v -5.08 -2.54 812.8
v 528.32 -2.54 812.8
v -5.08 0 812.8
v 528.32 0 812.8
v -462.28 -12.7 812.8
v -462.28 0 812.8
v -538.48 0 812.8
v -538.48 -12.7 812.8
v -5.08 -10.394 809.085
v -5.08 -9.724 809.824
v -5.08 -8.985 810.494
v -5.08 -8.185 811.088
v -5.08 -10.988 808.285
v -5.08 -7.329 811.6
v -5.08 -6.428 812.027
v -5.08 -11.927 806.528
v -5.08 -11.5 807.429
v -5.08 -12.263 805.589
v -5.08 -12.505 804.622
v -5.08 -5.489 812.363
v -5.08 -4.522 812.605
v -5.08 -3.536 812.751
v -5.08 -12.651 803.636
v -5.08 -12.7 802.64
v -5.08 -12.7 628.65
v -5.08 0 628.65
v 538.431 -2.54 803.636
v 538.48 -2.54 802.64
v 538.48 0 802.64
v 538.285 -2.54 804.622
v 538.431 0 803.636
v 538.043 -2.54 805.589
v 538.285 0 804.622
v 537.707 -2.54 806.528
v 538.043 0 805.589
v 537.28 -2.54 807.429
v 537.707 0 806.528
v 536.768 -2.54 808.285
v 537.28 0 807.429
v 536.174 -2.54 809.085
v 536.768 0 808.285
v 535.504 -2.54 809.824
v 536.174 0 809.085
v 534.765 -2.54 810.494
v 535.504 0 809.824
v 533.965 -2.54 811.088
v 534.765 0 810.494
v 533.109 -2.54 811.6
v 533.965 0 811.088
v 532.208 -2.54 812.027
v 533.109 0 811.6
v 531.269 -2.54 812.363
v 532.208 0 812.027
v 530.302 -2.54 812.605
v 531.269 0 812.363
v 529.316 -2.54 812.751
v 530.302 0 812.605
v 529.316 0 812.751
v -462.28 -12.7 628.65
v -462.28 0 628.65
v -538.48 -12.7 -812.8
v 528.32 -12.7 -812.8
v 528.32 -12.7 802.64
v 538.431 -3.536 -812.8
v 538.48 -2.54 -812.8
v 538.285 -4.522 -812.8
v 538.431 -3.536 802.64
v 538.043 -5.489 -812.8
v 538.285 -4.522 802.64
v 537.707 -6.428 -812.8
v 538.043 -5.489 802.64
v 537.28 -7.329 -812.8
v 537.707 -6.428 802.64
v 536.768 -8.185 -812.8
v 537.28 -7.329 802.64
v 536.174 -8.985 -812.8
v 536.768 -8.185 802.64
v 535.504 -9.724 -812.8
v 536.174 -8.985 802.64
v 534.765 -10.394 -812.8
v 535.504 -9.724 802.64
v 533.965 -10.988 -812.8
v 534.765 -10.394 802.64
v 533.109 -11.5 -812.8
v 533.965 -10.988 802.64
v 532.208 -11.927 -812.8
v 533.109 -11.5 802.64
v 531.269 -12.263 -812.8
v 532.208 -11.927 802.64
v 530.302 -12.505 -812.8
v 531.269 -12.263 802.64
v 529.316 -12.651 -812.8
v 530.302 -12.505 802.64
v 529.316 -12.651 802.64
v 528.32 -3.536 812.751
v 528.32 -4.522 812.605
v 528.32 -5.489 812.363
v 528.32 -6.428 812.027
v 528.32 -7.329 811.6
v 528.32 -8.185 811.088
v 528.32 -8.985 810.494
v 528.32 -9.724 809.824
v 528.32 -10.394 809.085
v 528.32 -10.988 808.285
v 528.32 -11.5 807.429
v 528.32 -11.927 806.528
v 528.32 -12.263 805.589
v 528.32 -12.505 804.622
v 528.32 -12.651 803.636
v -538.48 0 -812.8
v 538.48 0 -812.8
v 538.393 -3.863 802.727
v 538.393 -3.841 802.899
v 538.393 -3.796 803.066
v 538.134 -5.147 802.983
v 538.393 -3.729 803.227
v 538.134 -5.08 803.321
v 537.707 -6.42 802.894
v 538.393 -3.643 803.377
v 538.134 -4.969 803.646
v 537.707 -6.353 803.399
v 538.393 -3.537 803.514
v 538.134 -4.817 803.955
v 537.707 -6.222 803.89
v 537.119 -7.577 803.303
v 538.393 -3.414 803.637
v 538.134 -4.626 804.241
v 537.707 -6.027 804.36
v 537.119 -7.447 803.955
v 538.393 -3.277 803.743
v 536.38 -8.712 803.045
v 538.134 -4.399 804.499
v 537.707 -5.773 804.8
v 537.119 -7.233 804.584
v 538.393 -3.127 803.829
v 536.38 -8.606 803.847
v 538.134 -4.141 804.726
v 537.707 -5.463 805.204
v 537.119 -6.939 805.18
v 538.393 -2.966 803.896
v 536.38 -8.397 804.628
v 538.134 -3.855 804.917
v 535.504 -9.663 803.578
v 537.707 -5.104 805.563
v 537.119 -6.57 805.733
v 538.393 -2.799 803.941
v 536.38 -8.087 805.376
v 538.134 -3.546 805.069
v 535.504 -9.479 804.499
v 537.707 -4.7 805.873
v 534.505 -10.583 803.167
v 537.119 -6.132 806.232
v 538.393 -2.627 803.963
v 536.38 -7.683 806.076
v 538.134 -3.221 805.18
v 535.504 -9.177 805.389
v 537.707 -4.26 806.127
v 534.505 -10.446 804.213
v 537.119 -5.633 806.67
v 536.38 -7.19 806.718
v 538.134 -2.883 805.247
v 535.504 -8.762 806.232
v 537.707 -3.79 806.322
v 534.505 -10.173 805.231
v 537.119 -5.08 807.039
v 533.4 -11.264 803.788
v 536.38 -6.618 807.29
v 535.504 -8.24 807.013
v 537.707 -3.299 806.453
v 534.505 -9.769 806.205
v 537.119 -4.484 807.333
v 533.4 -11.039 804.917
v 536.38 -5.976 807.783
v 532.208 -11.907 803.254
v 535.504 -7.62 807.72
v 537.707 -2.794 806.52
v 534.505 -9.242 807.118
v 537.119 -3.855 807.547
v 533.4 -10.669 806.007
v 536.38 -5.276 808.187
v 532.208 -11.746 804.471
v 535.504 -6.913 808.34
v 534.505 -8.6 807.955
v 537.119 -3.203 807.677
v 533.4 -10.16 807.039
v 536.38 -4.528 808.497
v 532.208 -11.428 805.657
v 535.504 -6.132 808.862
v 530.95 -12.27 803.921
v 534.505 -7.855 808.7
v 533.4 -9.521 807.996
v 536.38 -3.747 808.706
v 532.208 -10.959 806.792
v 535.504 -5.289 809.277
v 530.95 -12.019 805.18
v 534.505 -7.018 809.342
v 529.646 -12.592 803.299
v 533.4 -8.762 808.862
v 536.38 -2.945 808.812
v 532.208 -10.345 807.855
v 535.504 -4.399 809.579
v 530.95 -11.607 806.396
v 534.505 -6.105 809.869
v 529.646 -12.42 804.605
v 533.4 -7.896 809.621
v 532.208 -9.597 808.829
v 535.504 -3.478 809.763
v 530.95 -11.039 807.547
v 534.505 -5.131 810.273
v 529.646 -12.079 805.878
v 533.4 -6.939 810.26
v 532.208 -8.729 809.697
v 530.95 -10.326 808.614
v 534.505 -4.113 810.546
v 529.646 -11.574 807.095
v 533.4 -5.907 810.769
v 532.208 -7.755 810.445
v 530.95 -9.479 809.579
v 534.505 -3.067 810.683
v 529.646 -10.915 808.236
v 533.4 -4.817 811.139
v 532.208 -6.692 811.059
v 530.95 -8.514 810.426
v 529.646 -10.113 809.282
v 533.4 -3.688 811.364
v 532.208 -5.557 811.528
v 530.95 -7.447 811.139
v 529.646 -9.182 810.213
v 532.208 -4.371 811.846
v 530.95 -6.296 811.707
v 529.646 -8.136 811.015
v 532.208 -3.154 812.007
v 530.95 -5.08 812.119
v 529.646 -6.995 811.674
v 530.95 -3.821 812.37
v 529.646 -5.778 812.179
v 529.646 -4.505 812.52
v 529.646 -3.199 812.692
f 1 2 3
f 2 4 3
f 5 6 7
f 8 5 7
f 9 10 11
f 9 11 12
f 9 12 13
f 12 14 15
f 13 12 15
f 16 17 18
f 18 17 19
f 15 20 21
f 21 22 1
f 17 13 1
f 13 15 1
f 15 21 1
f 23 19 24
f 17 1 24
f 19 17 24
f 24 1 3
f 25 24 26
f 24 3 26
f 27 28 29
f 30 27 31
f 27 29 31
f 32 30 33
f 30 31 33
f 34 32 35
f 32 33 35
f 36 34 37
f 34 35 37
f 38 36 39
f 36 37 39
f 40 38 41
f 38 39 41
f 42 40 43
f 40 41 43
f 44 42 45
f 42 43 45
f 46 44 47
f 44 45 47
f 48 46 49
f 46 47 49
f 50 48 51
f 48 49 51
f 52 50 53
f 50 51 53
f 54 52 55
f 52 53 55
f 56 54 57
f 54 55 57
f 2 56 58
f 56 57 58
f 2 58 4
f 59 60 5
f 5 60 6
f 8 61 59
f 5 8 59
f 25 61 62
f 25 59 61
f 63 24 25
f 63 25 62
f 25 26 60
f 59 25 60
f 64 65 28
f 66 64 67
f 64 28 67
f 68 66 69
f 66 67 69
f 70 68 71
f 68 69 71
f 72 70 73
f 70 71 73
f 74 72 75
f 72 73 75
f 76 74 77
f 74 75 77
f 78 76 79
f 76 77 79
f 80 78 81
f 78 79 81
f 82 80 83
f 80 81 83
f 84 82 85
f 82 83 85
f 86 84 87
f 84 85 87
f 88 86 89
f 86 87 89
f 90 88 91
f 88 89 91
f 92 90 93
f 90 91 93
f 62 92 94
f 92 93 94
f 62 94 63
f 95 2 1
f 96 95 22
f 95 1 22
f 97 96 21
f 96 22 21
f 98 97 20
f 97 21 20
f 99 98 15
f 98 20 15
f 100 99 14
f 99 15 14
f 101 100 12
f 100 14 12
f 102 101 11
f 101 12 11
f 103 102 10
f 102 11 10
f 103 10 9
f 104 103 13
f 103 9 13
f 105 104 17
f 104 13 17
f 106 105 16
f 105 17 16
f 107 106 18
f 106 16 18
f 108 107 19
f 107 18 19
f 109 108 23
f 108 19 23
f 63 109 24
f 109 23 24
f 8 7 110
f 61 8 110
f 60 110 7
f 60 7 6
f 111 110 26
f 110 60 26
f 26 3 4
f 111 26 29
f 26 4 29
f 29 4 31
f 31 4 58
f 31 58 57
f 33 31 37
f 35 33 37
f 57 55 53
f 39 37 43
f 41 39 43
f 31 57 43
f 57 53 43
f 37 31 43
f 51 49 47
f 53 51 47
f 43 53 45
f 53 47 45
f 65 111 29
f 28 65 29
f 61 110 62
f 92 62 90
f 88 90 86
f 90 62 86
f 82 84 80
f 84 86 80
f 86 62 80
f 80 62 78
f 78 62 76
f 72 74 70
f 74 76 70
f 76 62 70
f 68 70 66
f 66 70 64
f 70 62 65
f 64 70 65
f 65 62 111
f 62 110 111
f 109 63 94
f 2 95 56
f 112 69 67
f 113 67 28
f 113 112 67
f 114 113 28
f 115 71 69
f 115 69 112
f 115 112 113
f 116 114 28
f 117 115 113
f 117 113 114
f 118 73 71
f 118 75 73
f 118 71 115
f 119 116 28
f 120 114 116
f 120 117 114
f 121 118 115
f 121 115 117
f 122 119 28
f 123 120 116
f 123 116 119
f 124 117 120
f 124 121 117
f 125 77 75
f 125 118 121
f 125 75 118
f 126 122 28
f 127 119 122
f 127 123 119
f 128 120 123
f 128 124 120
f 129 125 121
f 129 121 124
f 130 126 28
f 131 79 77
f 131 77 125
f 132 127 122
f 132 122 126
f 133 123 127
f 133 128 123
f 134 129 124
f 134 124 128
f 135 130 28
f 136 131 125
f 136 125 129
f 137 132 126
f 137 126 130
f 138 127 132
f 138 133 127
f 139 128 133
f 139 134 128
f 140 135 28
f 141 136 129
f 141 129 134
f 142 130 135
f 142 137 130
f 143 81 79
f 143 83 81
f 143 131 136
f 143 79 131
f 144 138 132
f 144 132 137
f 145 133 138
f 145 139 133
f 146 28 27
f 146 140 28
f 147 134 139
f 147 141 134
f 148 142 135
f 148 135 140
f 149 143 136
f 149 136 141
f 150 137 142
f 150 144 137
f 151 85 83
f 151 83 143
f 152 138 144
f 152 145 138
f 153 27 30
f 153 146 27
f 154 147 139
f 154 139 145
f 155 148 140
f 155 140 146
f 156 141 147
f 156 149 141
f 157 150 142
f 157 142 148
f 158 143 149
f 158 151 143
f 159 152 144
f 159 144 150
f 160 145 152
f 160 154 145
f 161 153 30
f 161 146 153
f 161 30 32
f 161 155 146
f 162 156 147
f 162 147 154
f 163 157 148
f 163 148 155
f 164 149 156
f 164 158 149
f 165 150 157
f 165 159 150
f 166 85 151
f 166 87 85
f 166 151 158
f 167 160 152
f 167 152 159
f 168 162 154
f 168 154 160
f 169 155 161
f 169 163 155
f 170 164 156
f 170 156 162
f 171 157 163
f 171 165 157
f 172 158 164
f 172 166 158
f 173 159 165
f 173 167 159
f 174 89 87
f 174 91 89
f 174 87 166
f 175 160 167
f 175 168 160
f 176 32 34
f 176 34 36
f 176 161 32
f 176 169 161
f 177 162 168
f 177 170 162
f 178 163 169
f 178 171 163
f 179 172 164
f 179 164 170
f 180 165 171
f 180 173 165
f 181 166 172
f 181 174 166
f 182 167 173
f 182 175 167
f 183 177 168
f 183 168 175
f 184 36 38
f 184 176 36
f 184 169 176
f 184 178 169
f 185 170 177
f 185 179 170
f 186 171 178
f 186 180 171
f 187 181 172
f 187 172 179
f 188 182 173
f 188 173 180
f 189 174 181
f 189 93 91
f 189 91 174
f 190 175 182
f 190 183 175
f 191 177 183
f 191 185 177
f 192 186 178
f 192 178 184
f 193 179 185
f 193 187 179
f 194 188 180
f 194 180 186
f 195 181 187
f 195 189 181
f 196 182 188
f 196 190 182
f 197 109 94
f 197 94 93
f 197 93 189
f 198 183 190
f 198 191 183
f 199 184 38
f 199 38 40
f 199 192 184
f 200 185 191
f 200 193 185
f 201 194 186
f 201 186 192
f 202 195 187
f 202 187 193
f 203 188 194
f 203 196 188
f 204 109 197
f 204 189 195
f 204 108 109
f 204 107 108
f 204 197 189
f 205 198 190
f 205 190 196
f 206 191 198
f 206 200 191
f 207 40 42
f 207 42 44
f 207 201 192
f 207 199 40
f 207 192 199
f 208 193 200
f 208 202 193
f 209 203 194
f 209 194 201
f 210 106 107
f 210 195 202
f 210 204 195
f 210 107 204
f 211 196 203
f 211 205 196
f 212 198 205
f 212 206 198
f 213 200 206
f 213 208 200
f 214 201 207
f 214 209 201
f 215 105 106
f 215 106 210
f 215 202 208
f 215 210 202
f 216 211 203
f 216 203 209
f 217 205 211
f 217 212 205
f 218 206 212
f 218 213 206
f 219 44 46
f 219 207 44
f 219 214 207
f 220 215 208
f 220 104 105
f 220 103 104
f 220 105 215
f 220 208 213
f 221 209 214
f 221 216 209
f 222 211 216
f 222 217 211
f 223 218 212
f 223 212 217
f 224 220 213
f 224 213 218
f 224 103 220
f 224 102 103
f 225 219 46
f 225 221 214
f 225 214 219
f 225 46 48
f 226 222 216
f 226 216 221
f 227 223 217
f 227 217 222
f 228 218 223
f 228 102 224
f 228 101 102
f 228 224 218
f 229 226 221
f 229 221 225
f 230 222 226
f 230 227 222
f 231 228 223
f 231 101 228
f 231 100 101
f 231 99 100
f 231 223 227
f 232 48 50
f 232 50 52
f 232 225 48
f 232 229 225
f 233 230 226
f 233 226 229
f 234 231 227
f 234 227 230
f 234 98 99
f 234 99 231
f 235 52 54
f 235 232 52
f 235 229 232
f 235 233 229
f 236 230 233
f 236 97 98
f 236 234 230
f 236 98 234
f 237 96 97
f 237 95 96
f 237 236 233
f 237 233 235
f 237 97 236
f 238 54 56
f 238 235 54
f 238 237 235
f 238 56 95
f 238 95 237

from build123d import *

# Parameters (mm, degrees)
F1_DEPTH = 12.7
F2_R     = 10.16
F3_R     = 10.16


with BuildPart() as f1:
    # F0 (on Front) → F1 (new body)
    with BuildSketch(Plane.XZ):
        Polygon((-538.48, -812.8), (538.48, -812.8), (538.48, 812.8), (-5.08, 812.8), (-5.08, 628.65), (-462.28, 628.65), (-462.28, 812.8), (-538.48, 812.8), align=None)
    extrude(amount=F1_DEPTH)

    # F2
    f2_edges = [f1.edges().sort_by_distance(p)[0] for p in [
        (266.7, -12.7, 812.8),
    ]]
    fillet(f2_edges, radius=F2_R)

    # F3
    f3_edges = [f1.edges().sort_by_distance(p)[0] for p in [
        (538.48, -12.7, -5.08),
    ]]
    fillet(f3_edges, radius=F3_R)


solid = f1.part
